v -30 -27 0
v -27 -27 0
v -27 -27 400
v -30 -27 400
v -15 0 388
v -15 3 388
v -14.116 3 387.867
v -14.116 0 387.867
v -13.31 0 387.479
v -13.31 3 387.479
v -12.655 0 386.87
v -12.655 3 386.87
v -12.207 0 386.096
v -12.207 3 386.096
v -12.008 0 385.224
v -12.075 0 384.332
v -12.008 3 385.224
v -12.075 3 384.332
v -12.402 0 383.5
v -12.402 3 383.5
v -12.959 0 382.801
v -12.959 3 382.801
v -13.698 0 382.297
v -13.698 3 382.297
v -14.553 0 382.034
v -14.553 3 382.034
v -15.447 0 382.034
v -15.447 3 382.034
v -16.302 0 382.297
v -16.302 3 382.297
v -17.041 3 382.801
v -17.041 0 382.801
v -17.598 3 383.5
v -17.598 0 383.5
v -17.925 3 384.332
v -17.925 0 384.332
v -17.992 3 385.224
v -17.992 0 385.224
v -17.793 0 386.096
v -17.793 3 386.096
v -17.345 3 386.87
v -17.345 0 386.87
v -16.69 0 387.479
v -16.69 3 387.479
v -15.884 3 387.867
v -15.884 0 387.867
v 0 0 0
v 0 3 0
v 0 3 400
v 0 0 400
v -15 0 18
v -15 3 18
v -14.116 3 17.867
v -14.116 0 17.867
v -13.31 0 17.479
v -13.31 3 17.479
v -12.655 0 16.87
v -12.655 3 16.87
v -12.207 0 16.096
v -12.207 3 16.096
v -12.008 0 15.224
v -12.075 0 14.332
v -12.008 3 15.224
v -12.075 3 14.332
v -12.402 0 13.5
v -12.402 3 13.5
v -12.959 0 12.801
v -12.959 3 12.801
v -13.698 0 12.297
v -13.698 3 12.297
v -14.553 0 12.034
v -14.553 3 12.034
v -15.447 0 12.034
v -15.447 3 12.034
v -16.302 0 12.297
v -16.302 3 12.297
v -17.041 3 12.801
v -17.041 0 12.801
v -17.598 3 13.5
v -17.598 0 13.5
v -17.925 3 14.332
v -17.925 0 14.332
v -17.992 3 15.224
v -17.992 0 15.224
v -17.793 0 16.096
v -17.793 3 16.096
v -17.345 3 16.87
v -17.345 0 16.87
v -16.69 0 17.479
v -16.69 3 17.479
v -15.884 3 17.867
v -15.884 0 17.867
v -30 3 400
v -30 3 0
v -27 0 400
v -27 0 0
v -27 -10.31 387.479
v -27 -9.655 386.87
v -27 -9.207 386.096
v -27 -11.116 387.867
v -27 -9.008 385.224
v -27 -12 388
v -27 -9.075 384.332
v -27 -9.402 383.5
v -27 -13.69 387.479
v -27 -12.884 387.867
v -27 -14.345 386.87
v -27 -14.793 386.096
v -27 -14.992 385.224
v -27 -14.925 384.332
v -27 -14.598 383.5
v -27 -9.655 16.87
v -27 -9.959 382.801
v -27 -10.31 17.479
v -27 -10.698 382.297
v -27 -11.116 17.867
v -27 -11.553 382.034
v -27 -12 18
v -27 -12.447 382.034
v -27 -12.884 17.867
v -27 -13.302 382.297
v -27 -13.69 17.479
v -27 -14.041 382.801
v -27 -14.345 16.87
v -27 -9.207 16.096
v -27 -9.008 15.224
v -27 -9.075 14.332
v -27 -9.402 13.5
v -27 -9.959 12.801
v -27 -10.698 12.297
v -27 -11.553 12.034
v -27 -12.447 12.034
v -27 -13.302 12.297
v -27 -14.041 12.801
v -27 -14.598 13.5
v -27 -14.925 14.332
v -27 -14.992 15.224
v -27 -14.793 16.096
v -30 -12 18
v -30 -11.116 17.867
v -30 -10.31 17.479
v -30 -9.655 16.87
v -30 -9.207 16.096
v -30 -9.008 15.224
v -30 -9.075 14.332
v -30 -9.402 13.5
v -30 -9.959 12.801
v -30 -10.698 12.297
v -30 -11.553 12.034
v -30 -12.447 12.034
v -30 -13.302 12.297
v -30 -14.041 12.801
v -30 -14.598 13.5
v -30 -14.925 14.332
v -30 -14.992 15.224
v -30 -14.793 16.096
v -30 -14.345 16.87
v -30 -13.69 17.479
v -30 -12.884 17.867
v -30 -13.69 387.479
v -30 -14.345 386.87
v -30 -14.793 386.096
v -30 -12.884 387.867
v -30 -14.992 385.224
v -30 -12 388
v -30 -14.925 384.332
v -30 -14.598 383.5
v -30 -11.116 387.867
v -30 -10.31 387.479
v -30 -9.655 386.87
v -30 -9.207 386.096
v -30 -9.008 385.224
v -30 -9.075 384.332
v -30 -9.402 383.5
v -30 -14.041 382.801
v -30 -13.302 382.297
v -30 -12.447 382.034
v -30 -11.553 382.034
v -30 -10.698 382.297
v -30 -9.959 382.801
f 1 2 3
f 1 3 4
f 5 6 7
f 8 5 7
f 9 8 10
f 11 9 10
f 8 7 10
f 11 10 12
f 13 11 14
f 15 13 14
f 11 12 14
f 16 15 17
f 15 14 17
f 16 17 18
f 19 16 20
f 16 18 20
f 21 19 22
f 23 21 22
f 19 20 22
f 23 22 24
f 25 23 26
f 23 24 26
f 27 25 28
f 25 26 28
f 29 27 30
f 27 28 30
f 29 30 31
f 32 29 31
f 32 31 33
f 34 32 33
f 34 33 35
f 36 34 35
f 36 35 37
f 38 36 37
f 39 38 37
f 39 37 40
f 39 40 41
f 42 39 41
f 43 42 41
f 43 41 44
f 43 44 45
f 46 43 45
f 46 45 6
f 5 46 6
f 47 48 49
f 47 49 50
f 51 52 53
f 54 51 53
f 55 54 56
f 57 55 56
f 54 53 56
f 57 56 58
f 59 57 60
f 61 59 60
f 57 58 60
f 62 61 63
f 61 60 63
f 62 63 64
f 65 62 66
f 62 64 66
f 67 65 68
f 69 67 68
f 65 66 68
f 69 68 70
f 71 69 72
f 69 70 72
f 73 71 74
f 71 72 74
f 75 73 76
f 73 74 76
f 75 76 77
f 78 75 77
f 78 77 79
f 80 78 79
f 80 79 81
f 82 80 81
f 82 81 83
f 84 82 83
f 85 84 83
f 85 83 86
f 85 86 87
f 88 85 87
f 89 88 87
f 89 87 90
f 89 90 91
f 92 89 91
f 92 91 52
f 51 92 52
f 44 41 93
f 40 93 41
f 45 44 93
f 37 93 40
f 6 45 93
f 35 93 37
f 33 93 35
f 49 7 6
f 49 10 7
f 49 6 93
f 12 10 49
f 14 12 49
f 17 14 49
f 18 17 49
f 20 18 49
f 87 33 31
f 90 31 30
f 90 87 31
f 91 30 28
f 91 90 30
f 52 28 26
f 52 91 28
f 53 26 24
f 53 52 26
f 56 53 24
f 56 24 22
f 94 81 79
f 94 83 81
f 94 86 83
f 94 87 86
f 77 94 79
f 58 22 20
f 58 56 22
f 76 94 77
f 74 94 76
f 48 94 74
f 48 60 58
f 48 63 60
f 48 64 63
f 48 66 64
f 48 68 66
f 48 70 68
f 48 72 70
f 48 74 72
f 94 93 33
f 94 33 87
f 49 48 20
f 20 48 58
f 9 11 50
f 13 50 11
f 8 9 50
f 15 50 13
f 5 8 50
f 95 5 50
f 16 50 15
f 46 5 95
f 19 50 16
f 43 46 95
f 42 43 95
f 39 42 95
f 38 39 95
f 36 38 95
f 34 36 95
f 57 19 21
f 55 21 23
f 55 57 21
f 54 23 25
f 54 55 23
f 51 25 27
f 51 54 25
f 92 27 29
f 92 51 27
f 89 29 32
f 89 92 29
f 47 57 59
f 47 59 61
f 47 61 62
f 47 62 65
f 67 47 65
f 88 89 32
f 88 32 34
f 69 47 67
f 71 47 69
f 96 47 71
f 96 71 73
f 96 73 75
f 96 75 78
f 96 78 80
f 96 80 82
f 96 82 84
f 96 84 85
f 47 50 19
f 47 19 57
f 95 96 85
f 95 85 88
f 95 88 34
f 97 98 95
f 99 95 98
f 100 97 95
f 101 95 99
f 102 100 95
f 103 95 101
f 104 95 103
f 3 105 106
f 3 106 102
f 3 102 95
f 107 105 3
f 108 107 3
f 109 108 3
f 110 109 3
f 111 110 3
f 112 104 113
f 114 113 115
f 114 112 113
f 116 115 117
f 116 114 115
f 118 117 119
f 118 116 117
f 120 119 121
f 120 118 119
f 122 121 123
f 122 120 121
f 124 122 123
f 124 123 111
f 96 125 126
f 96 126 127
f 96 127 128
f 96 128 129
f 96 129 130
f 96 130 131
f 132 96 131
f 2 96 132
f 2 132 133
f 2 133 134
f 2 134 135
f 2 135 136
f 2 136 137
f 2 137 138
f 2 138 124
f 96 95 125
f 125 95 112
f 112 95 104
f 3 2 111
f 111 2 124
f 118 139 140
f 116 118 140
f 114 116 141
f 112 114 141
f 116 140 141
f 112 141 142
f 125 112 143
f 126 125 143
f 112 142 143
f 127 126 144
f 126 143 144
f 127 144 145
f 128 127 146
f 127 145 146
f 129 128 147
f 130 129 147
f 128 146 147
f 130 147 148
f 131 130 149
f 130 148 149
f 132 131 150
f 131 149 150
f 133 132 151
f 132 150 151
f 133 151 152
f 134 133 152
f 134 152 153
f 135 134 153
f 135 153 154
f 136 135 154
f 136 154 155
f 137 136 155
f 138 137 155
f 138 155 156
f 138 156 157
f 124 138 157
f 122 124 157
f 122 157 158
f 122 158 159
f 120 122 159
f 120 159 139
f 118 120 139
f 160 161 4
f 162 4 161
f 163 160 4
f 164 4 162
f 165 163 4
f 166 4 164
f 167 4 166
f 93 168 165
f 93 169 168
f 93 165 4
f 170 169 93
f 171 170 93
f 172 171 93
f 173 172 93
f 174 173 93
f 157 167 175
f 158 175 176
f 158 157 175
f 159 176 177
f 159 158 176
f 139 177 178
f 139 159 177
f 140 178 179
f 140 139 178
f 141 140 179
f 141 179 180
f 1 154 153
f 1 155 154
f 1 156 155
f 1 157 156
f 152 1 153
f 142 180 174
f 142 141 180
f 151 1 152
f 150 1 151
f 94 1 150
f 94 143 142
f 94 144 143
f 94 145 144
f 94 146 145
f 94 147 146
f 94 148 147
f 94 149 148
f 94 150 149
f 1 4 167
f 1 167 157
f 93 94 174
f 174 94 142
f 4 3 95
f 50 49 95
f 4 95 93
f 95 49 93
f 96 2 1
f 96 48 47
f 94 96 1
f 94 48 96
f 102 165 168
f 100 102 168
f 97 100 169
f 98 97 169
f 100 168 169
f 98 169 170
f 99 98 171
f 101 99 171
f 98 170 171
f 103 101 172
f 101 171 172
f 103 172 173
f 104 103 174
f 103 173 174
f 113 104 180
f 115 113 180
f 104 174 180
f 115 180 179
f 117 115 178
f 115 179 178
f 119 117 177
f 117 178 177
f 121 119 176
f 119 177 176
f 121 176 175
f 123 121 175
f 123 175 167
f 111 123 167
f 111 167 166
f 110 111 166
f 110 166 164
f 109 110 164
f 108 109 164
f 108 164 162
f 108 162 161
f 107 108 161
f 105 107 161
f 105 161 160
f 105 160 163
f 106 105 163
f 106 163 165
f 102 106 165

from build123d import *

# Parameters (mm, degrees)
EXTRUDE_THIN1_DEPTH = 400
SKETCH2_R           = 3
CUT_EXTRUDE1_DEPTH  = 10
LPATTERN1_COUNT     = 2
LPATTERN1_PITCH     = 370
SKETCH3_R           = 3
CUT_EXTRUDE2_DEPTH  = 10
LPATTERN2_COUNT     = 2
LPATTERN2_PITCH     = 370


with BuildPart() as part:
    # Sketch1 → Extrude-Thin1 (new body)
    with BuildSketch(Plane.XY):
        Polygon((0, 0), (-27, 0), (-27, -27), (-30, -27), (-30, 3), (0, 3), align=None)
    extrude(amount=EXTRUDE_THIN1_DEPTH)

    # Sketch2 → Cut-Extrude1 (cut)
    with BuildSketch(Plane(origin=(0, 3, 0), x_dir=(1, 0, 0), z_dir=(0, 1, 0))):
        with Locations(Location((-15, -15, 0), (0, 0, 270))):
            Circle(SKETCH2_R)
    cut_extrude1 = extrude(amount=-CUT_EXTRUDE1_DEPTH, mode=Mode.SUBTRACT)

    # LPattern1: Cut-Extrude1 ×2
    with Locations(*[(0, 0, i * LPATTERN1_PITCH) for i in range(1, LPATTERN1_COUNT)]):
        add(cut_extrude1, mode=Mode.SUBTRACT)

    # Sketch3 → Cut-Extrude2 (cut)
    with BuildSketch(Plane.ZY.offset(30)):
        with Locations((15, -12)):
            Circle(SKETCH3_R)
    cut_extrude2 = extrude(amount=-CUT_EXTRUDE2_DEPTH, mode=Mode.SUBTRACT)

    # LPattern2: Cut-Extrude2 ×2
    with Locations(*[(0, 0, i * LPATTERN2_PITCH) for i in range(1, LPATTERN2_COUNT)]):
        add(cut_extrude2, mode=Mode.SUBTRACT)


solid = part.part
